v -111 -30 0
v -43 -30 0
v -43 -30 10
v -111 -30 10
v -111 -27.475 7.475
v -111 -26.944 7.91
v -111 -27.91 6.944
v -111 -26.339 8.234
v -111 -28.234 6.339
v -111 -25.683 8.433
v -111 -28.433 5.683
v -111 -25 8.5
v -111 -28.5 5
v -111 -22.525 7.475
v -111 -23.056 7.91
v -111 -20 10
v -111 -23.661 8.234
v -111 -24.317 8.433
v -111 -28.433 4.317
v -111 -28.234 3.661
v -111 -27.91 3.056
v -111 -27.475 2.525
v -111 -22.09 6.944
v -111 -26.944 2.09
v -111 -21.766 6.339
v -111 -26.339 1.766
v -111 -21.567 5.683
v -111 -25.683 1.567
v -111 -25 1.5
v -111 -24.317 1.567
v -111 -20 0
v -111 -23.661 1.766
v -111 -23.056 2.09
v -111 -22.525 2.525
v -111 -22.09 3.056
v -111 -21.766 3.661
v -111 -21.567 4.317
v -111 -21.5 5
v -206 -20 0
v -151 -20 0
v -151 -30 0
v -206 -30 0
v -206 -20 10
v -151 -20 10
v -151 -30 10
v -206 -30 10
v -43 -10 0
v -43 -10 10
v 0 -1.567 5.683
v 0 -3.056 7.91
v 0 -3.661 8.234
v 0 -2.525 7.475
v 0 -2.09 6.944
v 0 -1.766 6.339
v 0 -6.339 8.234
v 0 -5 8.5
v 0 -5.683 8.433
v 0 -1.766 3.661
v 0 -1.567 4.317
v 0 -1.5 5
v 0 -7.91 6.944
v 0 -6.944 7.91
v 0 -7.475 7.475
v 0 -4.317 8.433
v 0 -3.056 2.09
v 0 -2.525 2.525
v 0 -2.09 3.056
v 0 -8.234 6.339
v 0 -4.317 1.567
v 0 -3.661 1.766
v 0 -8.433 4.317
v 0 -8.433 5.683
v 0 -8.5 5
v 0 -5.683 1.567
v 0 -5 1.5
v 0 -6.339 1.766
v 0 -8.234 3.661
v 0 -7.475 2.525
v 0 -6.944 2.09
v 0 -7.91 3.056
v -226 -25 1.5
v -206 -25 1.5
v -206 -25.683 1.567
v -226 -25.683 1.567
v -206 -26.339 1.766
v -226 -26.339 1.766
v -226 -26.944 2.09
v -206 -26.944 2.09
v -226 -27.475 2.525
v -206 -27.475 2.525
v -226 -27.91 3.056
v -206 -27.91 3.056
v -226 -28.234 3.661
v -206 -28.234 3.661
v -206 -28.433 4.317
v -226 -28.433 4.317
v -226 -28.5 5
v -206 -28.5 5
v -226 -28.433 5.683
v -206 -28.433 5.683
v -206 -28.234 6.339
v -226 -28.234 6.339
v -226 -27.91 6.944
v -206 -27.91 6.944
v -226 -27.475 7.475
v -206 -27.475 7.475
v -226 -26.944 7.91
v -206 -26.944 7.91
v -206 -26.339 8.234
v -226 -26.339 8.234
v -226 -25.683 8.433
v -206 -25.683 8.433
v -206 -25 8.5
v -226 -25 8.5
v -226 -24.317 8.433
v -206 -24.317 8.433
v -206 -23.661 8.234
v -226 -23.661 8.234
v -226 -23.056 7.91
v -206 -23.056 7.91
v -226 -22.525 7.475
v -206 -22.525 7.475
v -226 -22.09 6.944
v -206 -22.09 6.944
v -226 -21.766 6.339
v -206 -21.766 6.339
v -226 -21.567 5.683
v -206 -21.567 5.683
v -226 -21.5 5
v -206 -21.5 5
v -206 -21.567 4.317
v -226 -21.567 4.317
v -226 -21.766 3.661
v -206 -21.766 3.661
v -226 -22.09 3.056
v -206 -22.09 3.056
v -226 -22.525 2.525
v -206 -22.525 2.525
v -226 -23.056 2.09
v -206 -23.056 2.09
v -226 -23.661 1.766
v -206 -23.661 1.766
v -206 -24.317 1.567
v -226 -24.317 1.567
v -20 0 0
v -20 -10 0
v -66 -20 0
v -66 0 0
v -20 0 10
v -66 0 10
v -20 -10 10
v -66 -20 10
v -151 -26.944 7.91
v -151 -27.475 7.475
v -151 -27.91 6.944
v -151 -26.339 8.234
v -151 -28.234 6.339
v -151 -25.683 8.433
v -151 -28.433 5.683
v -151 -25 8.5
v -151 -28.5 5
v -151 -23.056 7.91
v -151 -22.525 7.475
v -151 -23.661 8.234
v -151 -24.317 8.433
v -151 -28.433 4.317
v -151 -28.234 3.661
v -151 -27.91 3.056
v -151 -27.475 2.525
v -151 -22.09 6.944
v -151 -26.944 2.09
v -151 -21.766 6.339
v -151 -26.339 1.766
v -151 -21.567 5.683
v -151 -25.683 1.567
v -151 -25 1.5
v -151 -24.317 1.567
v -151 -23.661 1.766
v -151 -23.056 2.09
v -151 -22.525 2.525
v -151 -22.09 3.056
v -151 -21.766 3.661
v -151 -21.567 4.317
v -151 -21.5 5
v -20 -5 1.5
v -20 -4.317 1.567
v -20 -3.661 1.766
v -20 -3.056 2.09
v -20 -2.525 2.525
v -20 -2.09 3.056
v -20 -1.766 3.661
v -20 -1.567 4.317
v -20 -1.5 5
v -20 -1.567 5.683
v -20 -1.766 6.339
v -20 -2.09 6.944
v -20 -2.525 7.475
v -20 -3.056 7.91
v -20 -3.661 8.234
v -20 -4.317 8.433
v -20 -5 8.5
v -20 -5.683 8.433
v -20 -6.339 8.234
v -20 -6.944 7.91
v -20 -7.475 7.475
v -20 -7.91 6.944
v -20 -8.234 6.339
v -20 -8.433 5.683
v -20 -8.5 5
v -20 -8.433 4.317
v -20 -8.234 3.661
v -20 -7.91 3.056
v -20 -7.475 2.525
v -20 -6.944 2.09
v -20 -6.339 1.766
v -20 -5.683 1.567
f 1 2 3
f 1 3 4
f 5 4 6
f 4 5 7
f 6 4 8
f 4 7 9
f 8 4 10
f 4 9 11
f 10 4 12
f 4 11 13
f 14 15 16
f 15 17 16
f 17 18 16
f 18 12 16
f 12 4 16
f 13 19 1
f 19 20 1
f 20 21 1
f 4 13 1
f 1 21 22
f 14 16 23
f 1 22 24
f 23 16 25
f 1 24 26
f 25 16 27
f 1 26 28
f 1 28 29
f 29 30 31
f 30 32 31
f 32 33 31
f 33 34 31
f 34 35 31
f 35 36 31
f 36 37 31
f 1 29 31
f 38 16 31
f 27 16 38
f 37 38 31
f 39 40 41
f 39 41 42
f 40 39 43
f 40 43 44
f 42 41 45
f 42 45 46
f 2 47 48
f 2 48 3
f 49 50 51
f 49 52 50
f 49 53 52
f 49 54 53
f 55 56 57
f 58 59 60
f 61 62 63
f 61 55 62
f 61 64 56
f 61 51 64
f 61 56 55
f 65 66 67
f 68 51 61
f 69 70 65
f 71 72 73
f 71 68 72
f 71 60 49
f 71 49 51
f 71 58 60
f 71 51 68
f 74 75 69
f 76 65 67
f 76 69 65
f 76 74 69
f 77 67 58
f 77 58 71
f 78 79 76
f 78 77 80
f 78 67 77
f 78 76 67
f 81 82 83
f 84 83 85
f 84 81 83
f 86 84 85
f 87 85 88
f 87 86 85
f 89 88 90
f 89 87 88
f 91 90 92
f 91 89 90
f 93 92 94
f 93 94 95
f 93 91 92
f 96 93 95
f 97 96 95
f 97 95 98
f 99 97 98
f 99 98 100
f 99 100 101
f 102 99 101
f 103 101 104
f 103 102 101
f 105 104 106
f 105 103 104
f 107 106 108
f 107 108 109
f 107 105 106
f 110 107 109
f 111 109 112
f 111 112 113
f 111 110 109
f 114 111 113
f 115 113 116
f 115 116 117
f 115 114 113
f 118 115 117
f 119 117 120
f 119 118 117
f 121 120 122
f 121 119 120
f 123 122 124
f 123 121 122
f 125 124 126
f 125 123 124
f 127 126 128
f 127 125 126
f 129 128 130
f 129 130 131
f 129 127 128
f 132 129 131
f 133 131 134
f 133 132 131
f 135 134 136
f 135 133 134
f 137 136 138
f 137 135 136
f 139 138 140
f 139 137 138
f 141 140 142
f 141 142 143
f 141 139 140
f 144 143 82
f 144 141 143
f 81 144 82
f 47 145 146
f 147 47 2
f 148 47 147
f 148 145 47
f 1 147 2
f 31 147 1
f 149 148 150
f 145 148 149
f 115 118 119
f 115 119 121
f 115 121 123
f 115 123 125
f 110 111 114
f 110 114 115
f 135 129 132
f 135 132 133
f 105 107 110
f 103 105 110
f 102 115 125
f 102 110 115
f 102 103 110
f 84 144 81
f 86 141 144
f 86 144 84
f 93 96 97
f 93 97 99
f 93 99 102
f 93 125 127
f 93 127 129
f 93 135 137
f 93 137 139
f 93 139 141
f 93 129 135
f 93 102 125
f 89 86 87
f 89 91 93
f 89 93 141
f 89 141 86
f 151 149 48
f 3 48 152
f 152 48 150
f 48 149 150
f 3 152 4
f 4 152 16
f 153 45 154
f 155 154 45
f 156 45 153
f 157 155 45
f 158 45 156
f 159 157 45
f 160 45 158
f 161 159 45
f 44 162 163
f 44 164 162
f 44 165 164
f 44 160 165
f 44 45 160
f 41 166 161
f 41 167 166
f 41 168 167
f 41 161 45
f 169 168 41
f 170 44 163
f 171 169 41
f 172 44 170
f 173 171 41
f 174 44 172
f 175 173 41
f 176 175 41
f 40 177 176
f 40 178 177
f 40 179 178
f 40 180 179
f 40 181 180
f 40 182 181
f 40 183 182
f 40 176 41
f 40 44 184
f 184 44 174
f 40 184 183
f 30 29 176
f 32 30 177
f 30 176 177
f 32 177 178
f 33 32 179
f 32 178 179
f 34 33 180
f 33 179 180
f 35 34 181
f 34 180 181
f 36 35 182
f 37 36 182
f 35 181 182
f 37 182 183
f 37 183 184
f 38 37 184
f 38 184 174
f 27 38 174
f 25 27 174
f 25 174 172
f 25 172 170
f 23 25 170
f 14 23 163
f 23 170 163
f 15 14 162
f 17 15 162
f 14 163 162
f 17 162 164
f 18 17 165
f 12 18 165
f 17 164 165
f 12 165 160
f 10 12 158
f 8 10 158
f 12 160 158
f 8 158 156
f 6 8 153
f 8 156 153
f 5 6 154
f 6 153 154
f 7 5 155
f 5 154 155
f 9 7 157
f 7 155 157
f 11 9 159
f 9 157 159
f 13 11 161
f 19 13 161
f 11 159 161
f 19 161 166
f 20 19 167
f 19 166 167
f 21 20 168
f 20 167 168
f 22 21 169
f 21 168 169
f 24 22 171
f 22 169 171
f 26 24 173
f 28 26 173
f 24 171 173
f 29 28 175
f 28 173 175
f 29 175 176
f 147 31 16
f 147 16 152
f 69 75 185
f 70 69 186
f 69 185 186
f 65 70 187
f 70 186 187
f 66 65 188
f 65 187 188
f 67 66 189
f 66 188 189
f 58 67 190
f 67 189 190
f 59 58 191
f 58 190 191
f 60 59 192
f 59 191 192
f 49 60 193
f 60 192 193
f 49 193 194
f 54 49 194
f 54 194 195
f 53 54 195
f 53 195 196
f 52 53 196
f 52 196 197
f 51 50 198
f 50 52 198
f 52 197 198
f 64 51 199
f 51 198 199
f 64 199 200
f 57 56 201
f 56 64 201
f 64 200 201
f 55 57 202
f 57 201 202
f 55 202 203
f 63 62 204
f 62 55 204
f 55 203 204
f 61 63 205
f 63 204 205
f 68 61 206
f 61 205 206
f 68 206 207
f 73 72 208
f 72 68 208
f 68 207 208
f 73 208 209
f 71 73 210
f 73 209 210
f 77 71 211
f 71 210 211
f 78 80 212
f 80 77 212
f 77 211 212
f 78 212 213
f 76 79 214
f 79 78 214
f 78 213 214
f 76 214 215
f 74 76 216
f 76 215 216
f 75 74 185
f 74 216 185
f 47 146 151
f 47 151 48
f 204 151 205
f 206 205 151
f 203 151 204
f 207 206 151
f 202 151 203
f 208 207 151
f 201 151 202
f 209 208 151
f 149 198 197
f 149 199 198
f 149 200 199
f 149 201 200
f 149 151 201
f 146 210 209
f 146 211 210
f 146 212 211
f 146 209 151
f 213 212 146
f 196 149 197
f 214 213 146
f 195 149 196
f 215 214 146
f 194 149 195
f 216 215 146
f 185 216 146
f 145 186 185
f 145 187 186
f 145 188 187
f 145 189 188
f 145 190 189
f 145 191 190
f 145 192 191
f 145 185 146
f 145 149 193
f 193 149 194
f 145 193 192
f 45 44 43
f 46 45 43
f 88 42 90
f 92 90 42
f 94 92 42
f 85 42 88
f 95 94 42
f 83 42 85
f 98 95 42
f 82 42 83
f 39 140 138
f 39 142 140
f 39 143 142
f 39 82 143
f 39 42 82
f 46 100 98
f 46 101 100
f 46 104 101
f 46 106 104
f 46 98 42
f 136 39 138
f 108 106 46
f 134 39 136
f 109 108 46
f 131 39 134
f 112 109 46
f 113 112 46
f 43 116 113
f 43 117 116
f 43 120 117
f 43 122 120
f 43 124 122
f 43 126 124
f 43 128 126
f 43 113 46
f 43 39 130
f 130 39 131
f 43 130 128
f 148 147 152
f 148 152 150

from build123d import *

# Parameters (mm, degrees)
BOSS_EXTRUDE1_DEPTH = 10
SKETCH4_W           = 10
SKETCH4_H           = 10
SKETCH4_R           = 3.5
CUT_EXTRUDE8_DEPTH  = 20
SKETCH12_W          = 10
SKETCH12_H          = 10
SKETCH12_R          = 3.5
CUT_EXTRUDE10_DEPTH = 20
SKETCH14_W          = 10
SKETCH14_H          = 10
SKETCH14_R          = 3.5
CUT_EXTRUDE12_DEPTH = 40
BOSS_EXTRUDE2_START = 20
SKETCH15_R          = 3.5
BOSS_EXTRUDE2_DEPTH = 20
SKETCH16_W          = 50
SKETCH16_H          = 20
CUT_EXTRUDE14_DEPTH = 200


with BuildPart() as part:
    # Sketch1 → Boss-Extrude1 (new body)
    with BuildSketch(Plane.XY):
        Polygon((-66, 0), (0, 0), (0, -10), (-43, -10), (-43, -30), (-206, -30), (-206, -10), (-246, -10), (-246, 0), (-196, 0), (-196, -20), (-66, -20), align=None)
    extrude(amount=BOSS_EXTRUDE1_DEPTH)

    # Sketch4 → Cut-Extrude8 (cut, symmetric)
    with BuildSketch(Plane(origin=(0, 0, 0), x_dir=(0, 0, -1), z_dir=(1, 0, 0))):
        with Locations((-5, -5)):
            Rectangle(SKETCH4_W, SKETCH4_H)
        with Locations((-5, -5)):
            Circle(SKETCH4_R, mode=Mode.SUBTRACT)
    extrude(amount=CUT_EXTRUDE8_DEPTH, both=True, mode=Mode.SUBTRACT)

    # Sketch12 → Cut-Extrude10 (cut, symmetric)
    with BuildSketch(Plane(origin=(-131, 0, 0), x_dir=(0, 0, -1), z_dir=(1, 0, 0))):
        with Locations((-5, -25)):
            Rectangle(SKETCH12_W, SKETCH12_H)
        with Locations((-5, -25)):
            Circle(SKETCH12_R, mode=Mode.SUBTRACT)
    extrude(amount=CUT_EXTRUDE10_DEPTH, both=True, mode=Mode.SUBTRACT)

    # Sketch14 → Cut-Extrude12 (cut)
    with BuildSketch(Plane.ZY.offset(246)):
        with Locations((5, -5)):
            Rectangle(SKETCH14_W, SKETCH14_H)
        with Locations(Location((5, -5, 0), (0, 0, 180))):
            Circle(SKETCH14_R, mode=Mode.SUBTRACT)
    extrude(amount=-CUT_EXTRUDE12_DEPTH, mode=Mode.SUBTRACT)

    # Sketch15 → Boss-Extrude2 (add)
    with BuildSketch(Plane.ZY.offset(206).offset(BOSS_EXTRUDE2_START)):
        with Locations(Location((5, -25, 0), (0, 0, 180))):
            Circle(SKETCH15_R)
    extrude(amount=-BOSS_EXTRUDE2_DEPTH)

    # Sketch16 → Cut-Extrude14 (cut)
    with BuildSketch(Plane.XY):
        with Locations((-221, -10)):
            Rectangle(SKETCH16_W, SKETCH16_H)
    extrude(amount=CUT_EXTRUDE14_DEPTH, mode=Mode.SUBTRACT)


solid = part.part
